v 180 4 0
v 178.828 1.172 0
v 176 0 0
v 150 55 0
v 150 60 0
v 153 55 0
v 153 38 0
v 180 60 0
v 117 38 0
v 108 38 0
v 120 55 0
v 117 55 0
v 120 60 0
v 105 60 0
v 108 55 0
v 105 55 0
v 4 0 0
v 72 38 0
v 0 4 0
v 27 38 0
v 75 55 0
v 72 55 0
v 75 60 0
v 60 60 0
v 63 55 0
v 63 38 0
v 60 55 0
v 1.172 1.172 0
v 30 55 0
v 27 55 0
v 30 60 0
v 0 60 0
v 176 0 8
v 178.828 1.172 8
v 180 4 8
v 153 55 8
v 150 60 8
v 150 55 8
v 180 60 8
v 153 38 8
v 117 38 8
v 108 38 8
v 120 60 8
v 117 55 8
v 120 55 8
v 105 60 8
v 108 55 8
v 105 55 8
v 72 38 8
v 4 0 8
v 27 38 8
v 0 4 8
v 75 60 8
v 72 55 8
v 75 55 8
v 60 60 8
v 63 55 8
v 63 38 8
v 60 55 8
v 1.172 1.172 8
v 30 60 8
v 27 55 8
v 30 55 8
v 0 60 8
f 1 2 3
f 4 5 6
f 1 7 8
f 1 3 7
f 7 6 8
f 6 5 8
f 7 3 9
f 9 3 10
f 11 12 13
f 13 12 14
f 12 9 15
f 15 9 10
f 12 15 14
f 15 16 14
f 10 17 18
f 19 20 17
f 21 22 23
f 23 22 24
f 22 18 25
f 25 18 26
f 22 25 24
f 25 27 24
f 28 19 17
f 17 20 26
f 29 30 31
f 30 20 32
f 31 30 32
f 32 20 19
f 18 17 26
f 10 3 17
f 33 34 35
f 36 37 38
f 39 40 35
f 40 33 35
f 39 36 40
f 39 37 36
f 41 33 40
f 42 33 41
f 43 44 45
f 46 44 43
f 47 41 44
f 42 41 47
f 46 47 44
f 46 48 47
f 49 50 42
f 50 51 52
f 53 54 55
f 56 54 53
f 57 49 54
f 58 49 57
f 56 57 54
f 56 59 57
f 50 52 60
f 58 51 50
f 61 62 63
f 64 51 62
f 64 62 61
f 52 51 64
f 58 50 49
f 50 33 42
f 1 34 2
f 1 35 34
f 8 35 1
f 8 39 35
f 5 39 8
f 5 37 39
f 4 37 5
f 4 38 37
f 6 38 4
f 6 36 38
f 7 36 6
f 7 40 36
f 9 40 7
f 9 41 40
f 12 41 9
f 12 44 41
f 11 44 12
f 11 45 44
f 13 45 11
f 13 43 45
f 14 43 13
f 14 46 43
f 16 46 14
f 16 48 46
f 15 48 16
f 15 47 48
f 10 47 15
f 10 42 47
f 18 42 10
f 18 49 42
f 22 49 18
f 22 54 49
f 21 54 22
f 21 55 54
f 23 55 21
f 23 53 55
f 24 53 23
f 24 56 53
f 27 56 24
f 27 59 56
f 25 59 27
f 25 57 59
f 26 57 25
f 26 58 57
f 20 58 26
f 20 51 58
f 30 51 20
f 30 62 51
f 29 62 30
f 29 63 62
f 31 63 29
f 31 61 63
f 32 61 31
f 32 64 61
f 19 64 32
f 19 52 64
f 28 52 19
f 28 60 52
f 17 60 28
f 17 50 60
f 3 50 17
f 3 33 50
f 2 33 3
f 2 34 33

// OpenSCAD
$fn = 32;

// ----------------------------------------------------------------------
// Oversize slot bar: 180 mm bar with 3 oversize windows
// ----------------------------------------------------------------------

// --- parameters (mm) ---
profile_height = 8;       // extrusion height
profile_points = 32;      // points of the closed outline

profile = [[0, 4], [1.172, 1.172], [4, 0], [176, 0], [178.828, 1.172], [180, 4], [180, 60], [150, 60], [150, 55], [153, 55], [153, 38], [117, 38], [117, 55], [120, 55], [120, 60], [105, 60], [105, 55], [108, 55], [108, 38], [72, 38], [72, 55], [75, 55], [75, 60], [60, 60], [60, 55], [63, 55], [63, 38], [27, 38], [27, 55], [30, 55], [30, 60], [0, 60]];  // single closed polygon, 32 points, counter clockwise

// --- the one profile operation ---
linear_extrude(height = profile_height) polygon(points = profile);
